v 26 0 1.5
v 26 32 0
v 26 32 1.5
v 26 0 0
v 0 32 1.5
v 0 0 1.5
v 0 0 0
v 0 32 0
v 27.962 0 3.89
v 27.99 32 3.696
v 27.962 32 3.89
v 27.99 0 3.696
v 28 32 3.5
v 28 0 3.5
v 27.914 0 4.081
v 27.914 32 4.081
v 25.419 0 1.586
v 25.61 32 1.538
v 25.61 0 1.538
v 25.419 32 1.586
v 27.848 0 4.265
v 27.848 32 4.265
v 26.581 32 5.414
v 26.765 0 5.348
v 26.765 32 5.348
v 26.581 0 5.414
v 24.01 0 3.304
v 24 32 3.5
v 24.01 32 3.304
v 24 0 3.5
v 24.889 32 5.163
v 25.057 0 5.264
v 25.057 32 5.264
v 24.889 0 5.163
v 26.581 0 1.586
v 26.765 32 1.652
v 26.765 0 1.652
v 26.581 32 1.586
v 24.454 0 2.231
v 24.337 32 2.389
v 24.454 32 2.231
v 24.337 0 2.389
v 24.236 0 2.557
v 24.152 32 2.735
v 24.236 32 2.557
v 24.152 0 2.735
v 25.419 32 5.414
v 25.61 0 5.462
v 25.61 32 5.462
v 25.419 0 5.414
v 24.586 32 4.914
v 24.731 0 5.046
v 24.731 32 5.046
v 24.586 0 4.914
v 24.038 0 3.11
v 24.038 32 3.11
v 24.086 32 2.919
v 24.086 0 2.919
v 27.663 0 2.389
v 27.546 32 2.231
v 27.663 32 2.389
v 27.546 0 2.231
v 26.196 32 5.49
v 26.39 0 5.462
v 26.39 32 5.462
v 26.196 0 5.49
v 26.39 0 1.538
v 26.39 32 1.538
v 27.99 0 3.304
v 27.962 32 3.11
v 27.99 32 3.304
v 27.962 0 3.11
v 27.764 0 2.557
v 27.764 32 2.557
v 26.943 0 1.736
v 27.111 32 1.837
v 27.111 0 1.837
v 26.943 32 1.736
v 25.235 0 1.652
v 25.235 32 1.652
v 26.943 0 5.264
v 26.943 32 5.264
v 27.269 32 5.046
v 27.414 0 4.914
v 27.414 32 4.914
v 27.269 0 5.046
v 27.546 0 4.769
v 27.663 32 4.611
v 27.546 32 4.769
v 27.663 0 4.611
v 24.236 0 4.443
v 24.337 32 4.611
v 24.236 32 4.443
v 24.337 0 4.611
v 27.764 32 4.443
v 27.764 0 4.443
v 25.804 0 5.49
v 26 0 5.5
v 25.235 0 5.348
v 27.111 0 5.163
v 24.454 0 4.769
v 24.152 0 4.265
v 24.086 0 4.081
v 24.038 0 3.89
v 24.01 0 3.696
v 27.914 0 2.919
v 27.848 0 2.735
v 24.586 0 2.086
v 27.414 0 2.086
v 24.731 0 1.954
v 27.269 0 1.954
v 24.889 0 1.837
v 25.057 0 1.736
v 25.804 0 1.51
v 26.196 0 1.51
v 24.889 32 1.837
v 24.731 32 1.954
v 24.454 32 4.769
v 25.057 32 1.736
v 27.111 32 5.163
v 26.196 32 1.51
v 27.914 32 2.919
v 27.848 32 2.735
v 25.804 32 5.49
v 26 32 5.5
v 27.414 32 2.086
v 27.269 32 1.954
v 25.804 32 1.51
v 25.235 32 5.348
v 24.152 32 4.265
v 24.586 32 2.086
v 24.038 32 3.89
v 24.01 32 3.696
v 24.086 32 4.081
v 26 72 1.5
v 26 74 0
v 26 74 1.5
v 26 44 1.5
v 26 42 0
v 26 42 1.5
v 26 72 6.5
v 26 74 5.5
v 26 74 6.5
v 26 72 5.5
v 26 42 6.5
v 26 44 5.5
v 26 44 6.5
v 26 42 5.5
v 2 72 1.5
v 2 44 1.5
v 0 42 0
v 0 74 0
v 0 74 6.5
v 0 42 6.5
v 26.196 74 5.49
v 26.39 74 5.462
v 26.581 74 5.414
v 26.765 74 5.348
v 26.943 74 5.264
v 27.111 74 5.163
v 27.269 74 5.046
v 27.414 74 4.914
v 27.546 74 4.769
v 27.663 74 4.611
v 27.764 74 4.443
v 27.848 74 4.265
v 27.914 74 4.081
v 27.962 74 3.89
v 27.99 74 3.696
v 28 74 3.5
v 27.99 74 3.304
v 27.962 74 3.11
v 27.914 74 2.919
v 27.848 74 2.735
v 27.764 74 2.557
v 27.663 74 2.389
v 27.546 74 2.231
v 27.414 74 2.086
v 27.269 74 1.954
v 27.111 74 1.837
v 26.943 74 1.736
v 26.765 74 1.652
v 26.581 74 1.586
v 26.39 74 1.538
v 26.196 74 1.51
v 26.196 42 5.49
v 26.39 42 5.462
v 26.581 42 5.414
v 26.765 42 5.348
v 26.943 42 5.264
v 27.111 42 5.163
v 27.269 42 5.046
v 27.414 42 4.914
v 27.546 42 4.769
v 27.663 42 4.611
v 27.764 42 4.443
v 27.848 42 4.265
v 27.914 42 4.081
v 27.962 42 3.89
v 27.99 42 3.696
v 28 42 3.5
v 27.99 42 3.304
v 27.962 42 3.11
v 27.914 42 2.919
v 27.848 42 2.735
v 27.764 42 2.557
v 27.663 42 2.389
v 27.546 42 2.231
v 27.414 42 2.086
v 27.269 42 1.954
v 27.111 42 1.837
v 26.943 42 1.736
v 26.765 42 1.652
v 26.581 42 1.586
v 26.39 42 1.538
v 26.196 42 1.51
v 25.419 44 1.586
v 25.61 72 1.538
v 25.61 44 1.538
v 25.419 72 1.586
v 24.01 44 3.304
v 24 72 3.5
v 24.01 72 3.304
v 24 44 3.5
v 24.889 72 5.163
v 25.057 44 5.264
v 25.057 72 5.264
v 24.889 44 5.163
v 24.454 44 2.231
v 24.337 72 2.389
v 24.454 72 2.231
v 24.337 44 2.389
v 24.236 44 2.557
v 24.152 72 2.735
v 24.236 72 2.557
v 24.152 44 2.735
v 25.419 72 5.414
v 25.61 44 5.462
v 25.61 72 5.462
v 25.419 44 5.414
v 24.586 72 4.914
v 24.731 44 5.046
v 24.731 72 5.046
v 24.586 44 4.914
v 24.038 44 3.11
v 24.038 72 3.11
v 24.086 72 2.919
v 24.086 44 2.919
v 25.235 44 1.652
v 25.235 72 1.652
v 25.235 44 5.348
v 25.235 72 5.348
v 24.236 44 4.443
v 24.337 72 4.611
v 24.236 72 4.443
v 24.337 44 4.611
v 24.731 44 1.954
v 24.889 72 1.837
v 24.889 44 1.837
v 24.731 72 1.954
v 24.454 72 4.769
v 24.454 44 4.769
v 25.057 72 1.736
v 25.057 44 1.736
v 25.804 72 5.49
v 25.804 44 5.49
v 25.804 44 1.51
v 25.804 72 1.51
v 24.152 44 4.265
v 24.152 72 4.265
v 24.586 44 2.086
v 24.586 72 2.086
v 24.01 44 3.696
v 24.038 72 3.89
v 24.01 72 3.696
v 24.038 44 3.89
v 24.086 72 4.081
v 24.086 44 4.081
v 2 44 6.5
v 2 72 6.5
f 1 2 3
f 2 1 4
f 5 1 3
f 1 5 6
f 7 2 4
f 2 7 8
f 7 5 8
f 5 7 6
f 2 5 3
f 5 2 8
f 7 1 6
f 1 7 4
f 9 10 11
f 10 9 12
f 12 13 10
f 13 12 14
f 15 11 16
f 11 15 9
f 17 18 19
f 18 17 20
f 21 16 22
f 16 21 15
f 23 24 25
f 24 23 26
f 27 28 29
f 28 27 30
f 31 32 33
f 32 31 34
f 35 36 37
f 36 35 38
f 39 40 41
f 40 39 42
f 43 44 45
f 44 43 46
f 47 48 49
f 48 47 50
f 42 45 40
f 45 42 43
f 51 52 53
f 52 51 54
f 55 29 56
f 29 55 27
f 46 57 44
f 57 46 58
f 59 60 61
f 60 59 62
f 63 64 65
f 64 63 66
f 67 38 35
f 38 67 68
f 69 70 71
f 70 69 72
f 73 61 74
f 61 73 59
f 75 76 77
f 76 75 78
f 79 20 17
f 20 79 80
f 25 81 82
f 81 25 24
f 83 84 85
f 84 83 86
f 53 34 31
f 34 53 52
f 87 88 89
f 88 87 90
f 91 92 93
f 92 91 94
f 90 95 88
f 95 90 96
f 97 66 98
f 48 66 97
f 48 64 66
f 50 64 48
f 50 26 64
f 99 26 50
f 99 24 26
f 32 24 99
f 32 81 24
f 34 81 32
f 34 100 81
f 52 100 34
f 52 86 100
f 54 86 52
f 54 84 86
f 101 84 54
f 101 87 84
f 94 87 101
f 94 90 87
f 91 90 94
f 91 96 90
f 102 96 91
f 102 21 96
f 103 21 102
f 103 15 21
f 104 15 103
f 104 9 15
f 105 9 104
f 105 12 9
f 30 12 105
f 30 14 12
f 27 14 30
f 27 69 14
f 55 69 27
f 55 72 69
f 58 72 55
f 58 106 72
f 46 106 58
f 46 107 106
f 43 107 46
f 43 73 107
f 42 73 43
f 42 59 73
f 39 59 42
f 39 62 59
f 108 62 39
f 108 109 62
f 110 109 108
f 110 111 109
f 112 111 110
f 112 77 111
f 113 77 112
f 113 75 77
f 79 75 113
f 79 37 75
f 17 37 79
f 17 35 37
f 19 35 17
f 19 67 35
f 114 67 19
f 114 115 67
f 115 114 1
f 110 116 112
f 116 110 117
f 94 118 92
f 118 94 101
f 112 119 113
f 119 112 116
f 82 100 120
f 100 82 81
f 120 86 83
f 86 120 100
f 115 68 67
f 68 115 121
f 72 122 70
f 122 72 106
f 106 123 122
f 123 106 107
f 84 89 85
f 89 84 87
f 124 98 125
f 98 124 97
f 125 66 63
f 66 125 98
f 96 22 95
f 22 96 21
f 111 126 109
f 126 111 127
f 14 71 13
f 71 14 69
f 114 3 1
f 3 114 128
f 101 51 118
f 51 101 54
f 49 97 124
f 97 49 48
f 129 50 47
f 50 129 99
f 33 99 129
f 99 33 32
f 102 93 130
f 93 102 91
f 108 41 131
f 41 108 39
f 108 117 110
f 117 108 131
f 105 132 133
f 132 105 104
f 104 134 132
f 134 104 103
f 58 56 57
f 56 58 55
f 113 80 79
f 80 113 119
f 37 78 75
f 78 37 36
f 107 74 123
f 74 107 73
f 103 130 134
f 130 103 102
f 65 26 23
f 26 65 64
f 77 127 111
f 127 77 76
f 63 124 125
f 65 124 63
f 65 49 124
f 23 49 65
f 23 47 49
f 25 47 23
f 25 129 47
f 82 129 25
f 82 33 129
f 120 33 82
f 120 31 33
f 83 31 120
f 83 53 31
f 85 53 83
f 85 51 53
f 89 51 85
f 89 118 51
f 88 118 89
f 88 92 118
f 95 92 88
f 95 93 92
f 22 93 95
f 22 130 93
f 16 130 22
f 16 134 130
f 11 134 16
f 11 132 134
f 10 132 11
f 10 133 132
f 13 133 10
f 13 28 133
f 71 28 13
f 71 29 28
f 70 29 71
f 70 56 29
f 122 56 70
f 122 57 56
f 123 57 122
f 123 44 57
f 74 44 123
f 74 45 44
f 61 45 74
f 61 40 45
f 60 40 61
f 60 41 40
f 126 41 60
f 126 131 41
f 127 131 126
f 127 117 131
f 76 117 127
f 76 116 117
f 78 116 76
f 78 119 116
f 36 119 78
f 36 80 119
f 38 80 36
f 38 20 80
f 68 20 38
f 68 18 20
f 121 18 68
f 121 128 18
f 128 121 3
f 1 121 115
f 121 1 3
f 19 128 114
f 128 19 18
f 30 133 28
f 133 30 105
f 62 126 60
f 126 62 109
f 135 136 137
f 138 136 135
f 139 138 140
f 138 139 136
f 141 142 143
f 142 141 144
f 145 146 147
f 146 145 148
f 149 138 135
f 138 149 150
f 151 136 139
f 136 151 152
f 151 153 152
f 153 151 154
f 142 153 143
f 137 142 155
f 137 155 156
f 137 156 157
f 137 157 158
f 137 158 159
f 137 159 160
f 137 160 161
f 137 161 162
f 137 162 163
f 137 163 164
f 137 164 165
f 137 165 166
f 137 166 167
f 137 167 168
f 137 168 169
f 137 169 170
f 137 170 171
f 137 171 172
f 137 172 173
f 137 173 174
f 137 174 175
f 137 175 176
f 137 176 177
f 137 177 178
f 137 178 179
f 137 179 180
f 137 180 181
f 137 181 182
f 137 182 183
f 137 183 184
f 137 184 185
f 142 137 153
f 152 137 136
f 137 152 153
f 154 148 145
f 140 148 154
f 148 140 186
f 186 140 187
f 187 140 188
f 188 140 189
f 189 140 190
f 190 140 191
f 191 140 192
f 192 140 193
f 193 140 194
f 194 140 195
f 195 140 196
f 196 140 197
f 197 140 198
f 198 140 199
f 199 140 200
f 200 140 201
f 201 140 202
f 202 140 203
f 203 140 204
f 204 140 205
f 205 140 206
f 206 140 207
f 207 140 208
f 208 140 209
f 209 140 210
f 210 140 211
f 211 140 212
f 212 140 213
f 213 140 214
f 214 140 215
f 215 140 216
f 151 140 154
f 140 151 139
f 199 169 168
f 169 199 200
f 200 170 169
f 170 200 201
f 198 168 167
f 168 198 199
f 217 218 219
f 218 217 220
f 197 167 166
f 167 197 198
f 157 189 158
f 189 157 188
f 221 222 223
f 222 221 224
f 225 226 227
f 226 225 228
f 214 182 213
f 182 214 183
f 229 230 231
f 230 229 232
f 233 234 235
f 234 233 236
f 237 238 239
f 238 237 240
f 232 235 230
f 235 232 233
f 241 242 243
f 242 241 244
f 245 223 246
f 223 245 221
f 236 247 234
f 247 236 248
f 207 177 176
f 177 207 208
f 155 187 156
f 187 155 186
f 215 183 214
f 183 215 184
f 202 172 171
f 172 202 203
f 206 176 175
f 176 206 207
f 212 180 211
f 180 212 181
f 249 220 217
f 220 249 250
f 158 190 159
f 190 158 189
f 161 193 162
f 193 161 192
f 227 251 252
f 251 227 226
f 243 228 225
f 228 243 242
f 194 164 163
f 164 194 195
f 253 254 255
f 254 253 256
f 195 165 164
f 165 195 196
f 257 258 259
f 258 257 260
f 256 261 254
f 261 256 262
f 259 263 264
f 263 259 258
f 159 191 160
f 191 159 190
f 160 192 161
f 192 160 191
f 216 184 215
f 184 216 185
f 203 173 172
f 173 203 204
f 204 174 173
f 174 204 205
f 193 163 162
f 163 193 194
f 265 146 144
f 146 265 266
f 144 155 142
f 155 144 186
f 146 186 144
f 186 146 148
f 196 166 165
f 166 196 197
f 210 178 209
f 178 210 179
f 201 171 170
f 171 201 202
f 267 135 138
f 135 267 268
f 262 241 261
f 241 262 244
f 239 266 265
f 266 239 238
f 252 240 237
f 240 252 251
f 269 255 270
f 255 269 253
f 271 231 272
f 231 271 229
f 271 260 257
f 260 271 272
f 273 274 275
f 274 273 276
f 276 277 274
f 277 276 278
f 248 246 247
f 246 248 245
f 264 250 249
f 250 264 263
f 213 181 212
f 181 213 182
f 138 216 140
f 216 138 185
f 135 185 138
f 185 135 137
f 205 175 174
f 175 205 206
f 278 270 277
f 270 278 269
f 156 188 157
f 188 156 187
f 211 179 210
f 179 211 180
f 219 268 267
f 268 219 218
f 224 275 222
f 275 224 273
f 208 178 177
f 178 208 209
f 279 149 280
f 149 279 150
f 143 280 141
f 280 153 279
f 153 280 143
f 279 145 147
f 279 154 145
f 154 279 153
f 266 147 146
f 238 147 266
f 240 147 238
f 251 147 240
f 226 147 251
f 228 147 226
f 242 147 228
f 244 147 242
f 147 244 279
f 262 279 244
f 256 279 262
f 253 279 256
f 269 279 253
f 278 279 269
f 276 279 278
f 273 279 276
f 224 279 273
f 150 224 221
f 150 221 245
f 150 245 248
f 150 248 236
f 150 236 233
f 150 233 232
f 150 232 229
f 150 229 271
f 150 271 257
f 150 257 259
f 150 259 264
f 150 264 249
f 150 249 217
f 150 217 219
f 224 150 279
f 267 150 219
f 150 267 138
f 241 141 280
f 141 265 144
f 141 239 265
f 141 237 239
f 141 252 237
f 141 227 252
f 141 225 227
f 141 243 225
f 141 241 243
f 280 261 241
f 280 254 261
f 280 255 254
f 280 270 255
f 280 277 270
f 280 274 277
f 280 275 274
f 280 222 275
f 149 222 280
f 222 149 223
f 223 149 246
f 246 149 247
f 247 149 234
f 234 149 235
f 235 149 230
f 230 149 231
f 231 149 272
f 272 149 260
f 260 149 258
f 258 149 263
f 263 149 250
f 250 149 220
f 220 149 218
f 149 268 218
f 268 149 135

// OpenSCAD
// Microduck beak liner reference — dimensions in millimetres.
//
// This is the physical counterpart of the simulator's shallow 24 mm-ball
// pocket.  It is intentionally parametric because Microduck beak revisions and
// printer shrinkage vary.  Measure the robot before printing; see README.md.

part = "both";              // "upper", "lower", or "both"
ball_diameter = 24.0;
inner_width = 28.0;         // clear space between side cheeks
cavity_depth = 26.0;        // rear stop to front lip
pad_thickness = 1.5;
wall_thickness = 2.0;
lip_radius = 2.0;
cheek_height = 5.0;
rear_stop_height = 5.0;
part_spacing = 10.0;
$fn = 64;

outer_width = inner_width + 2 * wall_thickness;

module transverse_rail(x, radius) {
    translate([x, outer_width, pad_thickness + radius])
        rotate([90, 0, 0])
            cylinder(h=outer_width, r=radius);
}

module lower_liner() {
    union() {
        cube([cavity_depth, outer_width, pad_thickness]);
        transverse_rail(cavity_depth, lip_radius);
    }
}

module upper_liner() {
    union() {
        cube([cavity_depth, outer_width, pad_thickness]);
        transverse_rail(cavity_depth, lip_radius);
        cube([wall_thickness, outer_width,
              pad_thickness + rear_stop_height]);
        cube([cavity_depth, wall_thickness,
              pad_thickness + cheek_height]);
        translate([0, outer_width - wall_thickness, 0])
            cube([cavity_depth, wall_thickness,
                  pad_thickness + cheek_height]);
    }
}

if (part == "upper") {
    upper_liner();
} else if (part == "lower") {
    lower_liner();
} else {
    lower_liner();
    translate([0, outer_width + part_spacing, 0]) upper_liner();
}
